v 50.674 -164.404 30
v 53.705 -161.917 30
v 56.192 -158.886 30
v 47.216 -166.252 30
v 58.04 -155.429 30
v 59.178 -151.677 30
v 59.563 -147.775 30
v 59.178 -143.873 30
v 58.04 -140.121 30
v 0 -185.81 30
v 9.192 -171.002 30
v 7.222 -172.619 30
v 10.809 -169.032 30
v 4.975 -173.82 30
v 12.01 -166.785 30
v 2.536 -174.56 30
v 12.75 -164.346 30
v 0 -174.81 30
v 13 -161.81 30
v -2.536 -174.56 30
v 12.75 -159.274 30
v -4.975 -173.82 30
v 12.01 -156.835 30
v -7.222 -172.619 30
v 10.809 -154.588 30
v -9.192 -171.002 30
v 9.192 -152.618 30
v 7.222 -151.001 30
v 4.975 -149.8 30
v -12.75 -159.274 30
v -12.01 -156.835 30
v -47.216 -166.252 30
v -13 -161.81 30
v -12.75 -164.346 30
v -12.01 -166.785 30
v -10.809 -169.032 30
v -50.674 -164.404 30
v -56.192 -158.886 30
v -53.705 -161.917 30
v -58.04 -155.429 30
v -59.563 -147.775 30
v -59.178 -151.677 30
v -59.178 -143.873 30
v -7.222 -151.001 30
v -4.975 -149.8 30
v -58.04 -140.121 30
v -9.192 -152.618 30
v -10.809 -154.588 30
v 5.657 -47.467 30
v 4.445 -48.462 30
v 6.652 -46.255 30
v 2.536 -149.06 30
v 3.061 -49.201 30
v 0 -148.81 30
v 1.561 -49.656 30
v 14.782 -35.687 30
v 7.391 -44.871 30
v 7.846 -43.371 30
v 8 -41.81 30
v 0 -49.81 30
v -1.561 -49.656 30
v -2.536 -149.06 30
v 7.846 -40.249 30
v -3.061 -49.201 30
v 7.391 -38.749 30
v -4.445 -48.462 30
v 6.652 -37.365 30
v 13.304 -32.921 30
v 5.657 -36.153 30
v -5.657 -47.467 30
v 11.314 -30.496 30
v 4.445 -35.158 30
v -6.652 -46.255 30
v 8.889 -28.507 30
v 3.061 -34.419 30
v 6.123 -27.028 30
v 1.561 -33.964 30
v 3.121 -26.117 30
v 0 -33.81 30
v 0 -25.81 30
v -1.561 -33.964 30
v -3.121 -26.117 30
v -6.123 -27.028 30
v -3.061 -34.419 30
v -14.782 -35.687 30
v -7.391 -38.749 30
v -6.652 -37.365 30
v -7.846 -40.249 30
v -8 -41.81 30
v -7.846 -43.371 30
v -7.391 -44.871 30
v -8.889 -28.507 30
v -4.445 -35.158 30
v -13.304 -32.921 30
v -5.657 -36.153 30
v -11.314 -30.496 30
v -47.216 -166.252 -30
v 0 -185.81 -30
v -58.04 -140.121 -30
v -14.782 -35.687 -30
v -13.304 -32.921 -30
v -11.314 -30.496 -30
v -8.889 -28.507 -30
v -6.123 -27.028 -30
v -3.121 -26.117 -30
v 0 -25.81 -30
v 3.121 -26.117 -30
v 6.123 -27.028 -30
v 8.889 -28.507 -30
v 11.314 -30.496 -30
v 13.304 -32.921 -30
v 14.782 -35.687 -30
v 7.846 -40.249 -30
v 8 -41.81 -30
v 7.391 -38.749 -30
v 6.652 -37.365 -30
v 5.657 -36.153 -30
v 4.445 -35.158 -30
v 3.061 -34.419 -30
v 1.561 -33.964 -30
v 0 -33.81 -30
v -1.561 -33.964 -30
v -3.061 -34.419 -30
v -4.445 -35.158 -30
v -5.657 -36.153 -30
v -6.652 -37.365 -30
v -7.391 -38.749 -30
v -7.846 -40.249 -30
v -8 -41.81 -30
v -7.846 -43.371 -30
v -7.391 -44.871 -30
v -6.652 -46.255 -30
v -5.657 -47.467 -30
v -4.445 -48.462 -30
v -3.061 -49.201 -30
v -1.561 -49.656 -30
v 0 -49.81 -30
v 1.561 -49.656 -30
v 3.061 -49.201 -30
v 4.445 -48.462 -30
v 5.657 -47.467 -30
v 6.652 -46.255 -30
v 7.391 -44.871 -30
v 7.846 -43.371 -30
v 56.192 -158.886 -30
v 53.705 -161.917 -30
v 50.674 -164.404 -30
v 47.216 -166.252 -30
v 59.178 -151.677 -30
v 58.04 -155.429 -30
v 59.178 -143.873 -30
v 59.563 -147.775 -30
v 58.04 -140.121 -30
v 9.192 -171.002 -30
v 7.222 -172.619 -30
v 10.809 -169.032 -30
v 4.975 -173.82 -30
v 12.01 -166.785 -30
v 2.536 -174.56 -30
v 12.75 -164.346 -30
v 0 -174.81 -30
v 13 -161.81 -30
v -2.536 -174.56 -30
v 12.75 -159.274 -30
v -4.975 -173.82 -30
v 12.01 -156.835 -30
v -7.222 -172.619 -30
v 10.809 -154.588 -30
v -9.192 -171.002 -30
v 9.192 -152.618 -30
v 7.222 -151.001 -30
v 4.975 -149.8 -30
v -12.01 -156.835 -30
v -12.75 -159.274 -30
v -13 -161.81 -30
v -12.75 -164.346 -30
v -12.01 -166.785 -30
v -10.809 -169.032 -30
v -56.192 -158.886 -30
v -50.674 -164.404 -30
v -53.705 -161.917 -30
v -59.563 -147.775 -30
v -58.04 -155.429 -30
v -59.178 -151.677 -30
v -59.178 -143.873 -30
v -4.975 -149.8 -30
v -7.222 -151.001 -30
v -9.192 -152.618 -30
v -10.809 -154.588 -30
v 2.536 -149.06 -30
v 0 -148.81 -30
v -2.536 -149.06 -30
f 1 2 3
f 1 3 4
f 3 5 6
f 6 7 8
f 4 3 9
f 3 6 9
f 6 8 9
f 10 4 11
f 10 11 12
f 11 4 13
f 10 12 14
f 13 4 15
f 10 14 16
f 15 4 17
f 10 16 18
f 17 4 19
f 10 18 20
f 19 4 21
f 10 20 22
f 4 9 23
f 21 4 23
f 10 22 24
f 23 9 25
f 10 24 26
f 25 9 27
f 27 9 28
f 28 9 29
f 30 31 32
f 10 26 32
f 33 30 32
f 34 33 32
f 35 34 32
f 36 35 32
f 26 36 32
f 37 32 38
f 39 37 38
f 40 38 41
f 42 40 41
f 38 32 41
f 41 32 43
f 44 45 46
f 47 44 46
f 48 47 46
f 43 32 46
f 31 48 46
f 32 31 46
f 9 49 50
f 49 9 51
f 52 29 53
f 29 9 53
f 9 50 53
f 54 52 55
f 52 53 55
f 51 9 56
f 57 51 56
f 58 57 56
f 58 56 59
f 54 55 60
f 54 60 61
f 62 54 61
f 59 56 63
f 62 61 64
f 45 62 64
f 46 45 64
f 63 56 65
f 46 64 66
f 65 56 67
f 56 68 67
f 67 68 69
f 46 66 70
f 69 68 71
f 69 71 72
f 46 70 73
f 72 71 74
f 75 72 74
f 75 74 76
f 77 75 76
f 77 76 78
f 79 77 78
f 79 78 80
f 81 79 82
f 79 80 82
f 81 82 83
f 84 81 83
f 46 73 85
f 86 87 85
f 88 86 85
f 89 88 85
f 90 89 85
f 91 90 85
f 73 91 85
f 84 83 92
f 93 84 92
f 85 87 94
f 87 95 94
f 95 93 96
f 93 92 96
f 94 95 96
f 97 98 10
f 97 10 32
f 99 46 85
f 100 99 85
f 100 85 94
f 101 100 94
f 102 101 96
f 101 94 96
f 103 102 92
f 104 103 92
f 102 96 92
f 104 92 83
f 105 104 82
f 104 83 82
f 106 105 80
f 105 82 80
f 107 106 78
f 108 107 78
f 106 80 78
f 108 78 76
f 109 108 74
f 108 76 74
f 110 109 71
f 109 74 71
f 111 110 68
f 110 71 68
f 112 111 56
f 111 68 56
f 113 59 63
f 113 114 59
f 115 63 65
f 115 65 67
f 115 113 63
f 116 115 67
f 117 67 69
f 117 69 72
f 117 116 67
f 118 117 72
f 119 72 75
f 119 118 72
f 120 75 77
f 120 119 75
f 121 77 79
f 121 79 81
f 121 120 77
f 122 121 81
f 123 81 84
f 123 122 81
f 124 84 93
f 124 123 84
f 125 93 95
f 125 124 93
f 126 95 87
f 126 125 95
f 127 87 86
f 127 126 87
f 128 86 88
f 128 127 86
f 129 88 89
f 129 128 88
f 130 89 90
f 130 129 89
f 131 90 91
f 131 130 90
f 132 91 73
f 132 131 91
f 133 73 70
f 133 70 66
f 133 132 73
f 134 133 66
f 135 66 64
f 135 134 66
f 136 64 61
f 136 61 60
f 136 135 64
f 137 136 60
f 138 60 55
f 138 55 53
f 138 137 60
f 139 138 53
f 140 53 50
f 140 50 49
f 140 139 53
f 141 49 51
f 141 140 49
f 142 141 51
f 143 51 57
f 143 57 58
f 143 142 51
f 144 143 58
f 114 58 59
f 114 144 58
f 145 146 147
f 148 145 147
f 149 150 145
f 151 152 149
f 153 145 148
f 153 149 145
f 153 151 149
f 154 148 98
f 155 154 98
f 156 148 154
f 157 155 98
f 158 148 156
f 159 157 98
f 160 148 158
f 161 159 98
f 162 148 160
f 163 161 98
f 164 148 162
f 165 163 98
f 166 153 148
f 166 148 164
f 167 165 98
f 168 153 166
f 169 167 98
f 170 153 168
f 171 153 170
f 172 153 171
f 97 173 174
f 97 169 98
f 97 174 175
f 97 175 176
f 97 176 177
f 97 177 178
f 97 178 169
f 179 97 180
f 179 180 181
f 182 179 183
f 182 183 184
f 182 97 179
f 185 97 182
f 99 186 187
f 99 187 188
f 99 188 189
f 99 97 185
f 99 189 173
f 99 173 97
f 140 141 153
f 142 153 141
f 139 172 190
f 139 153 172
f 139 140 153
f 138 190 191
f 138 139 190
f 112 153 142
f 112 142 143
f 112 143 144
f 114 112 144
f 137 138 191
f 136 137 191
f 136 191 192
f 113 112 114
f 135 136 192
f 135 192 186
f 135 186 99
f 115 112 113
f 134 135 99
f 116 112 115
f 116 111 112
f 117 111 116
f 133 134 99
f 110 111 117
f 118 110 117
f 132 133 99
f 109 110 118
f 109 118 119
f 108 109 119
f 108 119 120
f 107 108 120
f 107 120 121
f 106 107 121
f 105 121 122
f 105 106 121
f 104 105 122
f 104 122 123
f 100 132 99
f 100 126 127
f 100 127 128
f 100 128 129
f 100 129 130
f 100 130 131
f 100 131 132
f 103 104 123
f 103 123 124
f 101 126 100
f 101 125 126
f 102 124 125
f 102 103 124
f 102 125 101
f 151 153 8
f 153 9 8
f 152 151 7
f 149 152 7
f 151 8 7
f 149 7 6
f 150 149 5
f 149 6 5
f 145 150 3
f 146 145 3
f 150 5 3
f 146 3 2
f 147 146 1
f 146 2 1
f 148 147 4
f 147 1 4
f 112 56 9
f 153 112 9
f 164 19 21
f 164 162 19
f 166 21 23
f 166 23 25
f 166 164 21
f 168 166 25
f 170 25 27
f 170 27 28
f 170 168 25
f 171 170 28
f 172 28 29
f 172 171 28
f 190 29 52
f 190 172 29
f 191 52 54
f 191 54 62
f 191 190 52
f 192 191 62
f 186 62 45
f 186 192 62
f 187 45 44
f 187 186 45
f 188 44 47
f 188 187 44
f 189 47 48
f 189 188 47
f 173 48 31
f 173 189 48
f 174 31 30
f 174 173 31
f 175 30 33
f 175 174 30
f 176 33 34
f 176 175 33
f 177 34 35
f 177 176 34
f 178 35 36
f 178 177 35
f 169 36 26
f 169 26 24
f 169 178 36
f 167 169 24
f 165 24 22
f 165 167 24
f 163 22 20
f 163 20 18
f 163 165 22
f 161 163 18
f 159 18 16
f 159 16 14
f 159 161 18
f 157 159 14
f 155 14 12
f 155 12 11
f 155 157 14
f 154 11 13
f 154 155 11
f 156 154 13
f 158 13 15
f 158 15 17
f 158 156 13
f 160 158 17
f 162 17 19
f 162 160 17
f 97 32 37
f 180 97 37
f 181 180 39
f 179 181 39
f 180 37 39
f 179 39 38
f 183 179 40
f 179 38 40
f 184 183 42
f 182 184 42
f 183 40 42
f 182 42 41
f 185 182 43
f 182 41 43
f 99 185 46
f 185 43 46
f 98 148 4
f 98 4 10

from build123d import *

# Parameters (mm, degrees)
SKETCH_2_R      = 8
SKETCH_2_R_2    = 13
EXTRUDE_1_DEPTH = 30


with BuildPart() as part:
    # Эскиз2 → Бобышка-Вытянуть1 (new, symmetric)
    with BuildSketch(Plane.XY):
        with BuildLine():
            Line((14.78207252, -35.687079958), (58.040092118, -140.121177553))
            ThreePointArc((58.040092118, -140.121177553), (58.040092118, -155.428514848), (47.216170115, -166.252436851))
            Line((47.216170115, -166.252436851), (0, -185.810014876))
            Line((0, -185.810014876), (-47.216170115, -166.252436851))
            ThreePointArc((-47.216170115, -166.252436851), (-58.040092118, -155.428514848), (-58.040092118, -140.121177553))
            Line((-58.040092118, -140.121177553), (-14.78207252, -35.687079958))
            ThreePointArc((-14.78207252, -35.687079958), (0, -25.810014876), (14.78207252, -35.687079958))
        make_face()
        with Locations((0, -41.810014876)):
            Circle(SKETCH_2_R, mode=Mode.SUBTRACT)
        with Locations((0, -161.810014876)):
            Circle(SKETCH_2_R_2, mode=Mode.SUBTRACT)
    extrude(amount=EXTRUDE_1_DEPTH, both=True)


solid = part.part
